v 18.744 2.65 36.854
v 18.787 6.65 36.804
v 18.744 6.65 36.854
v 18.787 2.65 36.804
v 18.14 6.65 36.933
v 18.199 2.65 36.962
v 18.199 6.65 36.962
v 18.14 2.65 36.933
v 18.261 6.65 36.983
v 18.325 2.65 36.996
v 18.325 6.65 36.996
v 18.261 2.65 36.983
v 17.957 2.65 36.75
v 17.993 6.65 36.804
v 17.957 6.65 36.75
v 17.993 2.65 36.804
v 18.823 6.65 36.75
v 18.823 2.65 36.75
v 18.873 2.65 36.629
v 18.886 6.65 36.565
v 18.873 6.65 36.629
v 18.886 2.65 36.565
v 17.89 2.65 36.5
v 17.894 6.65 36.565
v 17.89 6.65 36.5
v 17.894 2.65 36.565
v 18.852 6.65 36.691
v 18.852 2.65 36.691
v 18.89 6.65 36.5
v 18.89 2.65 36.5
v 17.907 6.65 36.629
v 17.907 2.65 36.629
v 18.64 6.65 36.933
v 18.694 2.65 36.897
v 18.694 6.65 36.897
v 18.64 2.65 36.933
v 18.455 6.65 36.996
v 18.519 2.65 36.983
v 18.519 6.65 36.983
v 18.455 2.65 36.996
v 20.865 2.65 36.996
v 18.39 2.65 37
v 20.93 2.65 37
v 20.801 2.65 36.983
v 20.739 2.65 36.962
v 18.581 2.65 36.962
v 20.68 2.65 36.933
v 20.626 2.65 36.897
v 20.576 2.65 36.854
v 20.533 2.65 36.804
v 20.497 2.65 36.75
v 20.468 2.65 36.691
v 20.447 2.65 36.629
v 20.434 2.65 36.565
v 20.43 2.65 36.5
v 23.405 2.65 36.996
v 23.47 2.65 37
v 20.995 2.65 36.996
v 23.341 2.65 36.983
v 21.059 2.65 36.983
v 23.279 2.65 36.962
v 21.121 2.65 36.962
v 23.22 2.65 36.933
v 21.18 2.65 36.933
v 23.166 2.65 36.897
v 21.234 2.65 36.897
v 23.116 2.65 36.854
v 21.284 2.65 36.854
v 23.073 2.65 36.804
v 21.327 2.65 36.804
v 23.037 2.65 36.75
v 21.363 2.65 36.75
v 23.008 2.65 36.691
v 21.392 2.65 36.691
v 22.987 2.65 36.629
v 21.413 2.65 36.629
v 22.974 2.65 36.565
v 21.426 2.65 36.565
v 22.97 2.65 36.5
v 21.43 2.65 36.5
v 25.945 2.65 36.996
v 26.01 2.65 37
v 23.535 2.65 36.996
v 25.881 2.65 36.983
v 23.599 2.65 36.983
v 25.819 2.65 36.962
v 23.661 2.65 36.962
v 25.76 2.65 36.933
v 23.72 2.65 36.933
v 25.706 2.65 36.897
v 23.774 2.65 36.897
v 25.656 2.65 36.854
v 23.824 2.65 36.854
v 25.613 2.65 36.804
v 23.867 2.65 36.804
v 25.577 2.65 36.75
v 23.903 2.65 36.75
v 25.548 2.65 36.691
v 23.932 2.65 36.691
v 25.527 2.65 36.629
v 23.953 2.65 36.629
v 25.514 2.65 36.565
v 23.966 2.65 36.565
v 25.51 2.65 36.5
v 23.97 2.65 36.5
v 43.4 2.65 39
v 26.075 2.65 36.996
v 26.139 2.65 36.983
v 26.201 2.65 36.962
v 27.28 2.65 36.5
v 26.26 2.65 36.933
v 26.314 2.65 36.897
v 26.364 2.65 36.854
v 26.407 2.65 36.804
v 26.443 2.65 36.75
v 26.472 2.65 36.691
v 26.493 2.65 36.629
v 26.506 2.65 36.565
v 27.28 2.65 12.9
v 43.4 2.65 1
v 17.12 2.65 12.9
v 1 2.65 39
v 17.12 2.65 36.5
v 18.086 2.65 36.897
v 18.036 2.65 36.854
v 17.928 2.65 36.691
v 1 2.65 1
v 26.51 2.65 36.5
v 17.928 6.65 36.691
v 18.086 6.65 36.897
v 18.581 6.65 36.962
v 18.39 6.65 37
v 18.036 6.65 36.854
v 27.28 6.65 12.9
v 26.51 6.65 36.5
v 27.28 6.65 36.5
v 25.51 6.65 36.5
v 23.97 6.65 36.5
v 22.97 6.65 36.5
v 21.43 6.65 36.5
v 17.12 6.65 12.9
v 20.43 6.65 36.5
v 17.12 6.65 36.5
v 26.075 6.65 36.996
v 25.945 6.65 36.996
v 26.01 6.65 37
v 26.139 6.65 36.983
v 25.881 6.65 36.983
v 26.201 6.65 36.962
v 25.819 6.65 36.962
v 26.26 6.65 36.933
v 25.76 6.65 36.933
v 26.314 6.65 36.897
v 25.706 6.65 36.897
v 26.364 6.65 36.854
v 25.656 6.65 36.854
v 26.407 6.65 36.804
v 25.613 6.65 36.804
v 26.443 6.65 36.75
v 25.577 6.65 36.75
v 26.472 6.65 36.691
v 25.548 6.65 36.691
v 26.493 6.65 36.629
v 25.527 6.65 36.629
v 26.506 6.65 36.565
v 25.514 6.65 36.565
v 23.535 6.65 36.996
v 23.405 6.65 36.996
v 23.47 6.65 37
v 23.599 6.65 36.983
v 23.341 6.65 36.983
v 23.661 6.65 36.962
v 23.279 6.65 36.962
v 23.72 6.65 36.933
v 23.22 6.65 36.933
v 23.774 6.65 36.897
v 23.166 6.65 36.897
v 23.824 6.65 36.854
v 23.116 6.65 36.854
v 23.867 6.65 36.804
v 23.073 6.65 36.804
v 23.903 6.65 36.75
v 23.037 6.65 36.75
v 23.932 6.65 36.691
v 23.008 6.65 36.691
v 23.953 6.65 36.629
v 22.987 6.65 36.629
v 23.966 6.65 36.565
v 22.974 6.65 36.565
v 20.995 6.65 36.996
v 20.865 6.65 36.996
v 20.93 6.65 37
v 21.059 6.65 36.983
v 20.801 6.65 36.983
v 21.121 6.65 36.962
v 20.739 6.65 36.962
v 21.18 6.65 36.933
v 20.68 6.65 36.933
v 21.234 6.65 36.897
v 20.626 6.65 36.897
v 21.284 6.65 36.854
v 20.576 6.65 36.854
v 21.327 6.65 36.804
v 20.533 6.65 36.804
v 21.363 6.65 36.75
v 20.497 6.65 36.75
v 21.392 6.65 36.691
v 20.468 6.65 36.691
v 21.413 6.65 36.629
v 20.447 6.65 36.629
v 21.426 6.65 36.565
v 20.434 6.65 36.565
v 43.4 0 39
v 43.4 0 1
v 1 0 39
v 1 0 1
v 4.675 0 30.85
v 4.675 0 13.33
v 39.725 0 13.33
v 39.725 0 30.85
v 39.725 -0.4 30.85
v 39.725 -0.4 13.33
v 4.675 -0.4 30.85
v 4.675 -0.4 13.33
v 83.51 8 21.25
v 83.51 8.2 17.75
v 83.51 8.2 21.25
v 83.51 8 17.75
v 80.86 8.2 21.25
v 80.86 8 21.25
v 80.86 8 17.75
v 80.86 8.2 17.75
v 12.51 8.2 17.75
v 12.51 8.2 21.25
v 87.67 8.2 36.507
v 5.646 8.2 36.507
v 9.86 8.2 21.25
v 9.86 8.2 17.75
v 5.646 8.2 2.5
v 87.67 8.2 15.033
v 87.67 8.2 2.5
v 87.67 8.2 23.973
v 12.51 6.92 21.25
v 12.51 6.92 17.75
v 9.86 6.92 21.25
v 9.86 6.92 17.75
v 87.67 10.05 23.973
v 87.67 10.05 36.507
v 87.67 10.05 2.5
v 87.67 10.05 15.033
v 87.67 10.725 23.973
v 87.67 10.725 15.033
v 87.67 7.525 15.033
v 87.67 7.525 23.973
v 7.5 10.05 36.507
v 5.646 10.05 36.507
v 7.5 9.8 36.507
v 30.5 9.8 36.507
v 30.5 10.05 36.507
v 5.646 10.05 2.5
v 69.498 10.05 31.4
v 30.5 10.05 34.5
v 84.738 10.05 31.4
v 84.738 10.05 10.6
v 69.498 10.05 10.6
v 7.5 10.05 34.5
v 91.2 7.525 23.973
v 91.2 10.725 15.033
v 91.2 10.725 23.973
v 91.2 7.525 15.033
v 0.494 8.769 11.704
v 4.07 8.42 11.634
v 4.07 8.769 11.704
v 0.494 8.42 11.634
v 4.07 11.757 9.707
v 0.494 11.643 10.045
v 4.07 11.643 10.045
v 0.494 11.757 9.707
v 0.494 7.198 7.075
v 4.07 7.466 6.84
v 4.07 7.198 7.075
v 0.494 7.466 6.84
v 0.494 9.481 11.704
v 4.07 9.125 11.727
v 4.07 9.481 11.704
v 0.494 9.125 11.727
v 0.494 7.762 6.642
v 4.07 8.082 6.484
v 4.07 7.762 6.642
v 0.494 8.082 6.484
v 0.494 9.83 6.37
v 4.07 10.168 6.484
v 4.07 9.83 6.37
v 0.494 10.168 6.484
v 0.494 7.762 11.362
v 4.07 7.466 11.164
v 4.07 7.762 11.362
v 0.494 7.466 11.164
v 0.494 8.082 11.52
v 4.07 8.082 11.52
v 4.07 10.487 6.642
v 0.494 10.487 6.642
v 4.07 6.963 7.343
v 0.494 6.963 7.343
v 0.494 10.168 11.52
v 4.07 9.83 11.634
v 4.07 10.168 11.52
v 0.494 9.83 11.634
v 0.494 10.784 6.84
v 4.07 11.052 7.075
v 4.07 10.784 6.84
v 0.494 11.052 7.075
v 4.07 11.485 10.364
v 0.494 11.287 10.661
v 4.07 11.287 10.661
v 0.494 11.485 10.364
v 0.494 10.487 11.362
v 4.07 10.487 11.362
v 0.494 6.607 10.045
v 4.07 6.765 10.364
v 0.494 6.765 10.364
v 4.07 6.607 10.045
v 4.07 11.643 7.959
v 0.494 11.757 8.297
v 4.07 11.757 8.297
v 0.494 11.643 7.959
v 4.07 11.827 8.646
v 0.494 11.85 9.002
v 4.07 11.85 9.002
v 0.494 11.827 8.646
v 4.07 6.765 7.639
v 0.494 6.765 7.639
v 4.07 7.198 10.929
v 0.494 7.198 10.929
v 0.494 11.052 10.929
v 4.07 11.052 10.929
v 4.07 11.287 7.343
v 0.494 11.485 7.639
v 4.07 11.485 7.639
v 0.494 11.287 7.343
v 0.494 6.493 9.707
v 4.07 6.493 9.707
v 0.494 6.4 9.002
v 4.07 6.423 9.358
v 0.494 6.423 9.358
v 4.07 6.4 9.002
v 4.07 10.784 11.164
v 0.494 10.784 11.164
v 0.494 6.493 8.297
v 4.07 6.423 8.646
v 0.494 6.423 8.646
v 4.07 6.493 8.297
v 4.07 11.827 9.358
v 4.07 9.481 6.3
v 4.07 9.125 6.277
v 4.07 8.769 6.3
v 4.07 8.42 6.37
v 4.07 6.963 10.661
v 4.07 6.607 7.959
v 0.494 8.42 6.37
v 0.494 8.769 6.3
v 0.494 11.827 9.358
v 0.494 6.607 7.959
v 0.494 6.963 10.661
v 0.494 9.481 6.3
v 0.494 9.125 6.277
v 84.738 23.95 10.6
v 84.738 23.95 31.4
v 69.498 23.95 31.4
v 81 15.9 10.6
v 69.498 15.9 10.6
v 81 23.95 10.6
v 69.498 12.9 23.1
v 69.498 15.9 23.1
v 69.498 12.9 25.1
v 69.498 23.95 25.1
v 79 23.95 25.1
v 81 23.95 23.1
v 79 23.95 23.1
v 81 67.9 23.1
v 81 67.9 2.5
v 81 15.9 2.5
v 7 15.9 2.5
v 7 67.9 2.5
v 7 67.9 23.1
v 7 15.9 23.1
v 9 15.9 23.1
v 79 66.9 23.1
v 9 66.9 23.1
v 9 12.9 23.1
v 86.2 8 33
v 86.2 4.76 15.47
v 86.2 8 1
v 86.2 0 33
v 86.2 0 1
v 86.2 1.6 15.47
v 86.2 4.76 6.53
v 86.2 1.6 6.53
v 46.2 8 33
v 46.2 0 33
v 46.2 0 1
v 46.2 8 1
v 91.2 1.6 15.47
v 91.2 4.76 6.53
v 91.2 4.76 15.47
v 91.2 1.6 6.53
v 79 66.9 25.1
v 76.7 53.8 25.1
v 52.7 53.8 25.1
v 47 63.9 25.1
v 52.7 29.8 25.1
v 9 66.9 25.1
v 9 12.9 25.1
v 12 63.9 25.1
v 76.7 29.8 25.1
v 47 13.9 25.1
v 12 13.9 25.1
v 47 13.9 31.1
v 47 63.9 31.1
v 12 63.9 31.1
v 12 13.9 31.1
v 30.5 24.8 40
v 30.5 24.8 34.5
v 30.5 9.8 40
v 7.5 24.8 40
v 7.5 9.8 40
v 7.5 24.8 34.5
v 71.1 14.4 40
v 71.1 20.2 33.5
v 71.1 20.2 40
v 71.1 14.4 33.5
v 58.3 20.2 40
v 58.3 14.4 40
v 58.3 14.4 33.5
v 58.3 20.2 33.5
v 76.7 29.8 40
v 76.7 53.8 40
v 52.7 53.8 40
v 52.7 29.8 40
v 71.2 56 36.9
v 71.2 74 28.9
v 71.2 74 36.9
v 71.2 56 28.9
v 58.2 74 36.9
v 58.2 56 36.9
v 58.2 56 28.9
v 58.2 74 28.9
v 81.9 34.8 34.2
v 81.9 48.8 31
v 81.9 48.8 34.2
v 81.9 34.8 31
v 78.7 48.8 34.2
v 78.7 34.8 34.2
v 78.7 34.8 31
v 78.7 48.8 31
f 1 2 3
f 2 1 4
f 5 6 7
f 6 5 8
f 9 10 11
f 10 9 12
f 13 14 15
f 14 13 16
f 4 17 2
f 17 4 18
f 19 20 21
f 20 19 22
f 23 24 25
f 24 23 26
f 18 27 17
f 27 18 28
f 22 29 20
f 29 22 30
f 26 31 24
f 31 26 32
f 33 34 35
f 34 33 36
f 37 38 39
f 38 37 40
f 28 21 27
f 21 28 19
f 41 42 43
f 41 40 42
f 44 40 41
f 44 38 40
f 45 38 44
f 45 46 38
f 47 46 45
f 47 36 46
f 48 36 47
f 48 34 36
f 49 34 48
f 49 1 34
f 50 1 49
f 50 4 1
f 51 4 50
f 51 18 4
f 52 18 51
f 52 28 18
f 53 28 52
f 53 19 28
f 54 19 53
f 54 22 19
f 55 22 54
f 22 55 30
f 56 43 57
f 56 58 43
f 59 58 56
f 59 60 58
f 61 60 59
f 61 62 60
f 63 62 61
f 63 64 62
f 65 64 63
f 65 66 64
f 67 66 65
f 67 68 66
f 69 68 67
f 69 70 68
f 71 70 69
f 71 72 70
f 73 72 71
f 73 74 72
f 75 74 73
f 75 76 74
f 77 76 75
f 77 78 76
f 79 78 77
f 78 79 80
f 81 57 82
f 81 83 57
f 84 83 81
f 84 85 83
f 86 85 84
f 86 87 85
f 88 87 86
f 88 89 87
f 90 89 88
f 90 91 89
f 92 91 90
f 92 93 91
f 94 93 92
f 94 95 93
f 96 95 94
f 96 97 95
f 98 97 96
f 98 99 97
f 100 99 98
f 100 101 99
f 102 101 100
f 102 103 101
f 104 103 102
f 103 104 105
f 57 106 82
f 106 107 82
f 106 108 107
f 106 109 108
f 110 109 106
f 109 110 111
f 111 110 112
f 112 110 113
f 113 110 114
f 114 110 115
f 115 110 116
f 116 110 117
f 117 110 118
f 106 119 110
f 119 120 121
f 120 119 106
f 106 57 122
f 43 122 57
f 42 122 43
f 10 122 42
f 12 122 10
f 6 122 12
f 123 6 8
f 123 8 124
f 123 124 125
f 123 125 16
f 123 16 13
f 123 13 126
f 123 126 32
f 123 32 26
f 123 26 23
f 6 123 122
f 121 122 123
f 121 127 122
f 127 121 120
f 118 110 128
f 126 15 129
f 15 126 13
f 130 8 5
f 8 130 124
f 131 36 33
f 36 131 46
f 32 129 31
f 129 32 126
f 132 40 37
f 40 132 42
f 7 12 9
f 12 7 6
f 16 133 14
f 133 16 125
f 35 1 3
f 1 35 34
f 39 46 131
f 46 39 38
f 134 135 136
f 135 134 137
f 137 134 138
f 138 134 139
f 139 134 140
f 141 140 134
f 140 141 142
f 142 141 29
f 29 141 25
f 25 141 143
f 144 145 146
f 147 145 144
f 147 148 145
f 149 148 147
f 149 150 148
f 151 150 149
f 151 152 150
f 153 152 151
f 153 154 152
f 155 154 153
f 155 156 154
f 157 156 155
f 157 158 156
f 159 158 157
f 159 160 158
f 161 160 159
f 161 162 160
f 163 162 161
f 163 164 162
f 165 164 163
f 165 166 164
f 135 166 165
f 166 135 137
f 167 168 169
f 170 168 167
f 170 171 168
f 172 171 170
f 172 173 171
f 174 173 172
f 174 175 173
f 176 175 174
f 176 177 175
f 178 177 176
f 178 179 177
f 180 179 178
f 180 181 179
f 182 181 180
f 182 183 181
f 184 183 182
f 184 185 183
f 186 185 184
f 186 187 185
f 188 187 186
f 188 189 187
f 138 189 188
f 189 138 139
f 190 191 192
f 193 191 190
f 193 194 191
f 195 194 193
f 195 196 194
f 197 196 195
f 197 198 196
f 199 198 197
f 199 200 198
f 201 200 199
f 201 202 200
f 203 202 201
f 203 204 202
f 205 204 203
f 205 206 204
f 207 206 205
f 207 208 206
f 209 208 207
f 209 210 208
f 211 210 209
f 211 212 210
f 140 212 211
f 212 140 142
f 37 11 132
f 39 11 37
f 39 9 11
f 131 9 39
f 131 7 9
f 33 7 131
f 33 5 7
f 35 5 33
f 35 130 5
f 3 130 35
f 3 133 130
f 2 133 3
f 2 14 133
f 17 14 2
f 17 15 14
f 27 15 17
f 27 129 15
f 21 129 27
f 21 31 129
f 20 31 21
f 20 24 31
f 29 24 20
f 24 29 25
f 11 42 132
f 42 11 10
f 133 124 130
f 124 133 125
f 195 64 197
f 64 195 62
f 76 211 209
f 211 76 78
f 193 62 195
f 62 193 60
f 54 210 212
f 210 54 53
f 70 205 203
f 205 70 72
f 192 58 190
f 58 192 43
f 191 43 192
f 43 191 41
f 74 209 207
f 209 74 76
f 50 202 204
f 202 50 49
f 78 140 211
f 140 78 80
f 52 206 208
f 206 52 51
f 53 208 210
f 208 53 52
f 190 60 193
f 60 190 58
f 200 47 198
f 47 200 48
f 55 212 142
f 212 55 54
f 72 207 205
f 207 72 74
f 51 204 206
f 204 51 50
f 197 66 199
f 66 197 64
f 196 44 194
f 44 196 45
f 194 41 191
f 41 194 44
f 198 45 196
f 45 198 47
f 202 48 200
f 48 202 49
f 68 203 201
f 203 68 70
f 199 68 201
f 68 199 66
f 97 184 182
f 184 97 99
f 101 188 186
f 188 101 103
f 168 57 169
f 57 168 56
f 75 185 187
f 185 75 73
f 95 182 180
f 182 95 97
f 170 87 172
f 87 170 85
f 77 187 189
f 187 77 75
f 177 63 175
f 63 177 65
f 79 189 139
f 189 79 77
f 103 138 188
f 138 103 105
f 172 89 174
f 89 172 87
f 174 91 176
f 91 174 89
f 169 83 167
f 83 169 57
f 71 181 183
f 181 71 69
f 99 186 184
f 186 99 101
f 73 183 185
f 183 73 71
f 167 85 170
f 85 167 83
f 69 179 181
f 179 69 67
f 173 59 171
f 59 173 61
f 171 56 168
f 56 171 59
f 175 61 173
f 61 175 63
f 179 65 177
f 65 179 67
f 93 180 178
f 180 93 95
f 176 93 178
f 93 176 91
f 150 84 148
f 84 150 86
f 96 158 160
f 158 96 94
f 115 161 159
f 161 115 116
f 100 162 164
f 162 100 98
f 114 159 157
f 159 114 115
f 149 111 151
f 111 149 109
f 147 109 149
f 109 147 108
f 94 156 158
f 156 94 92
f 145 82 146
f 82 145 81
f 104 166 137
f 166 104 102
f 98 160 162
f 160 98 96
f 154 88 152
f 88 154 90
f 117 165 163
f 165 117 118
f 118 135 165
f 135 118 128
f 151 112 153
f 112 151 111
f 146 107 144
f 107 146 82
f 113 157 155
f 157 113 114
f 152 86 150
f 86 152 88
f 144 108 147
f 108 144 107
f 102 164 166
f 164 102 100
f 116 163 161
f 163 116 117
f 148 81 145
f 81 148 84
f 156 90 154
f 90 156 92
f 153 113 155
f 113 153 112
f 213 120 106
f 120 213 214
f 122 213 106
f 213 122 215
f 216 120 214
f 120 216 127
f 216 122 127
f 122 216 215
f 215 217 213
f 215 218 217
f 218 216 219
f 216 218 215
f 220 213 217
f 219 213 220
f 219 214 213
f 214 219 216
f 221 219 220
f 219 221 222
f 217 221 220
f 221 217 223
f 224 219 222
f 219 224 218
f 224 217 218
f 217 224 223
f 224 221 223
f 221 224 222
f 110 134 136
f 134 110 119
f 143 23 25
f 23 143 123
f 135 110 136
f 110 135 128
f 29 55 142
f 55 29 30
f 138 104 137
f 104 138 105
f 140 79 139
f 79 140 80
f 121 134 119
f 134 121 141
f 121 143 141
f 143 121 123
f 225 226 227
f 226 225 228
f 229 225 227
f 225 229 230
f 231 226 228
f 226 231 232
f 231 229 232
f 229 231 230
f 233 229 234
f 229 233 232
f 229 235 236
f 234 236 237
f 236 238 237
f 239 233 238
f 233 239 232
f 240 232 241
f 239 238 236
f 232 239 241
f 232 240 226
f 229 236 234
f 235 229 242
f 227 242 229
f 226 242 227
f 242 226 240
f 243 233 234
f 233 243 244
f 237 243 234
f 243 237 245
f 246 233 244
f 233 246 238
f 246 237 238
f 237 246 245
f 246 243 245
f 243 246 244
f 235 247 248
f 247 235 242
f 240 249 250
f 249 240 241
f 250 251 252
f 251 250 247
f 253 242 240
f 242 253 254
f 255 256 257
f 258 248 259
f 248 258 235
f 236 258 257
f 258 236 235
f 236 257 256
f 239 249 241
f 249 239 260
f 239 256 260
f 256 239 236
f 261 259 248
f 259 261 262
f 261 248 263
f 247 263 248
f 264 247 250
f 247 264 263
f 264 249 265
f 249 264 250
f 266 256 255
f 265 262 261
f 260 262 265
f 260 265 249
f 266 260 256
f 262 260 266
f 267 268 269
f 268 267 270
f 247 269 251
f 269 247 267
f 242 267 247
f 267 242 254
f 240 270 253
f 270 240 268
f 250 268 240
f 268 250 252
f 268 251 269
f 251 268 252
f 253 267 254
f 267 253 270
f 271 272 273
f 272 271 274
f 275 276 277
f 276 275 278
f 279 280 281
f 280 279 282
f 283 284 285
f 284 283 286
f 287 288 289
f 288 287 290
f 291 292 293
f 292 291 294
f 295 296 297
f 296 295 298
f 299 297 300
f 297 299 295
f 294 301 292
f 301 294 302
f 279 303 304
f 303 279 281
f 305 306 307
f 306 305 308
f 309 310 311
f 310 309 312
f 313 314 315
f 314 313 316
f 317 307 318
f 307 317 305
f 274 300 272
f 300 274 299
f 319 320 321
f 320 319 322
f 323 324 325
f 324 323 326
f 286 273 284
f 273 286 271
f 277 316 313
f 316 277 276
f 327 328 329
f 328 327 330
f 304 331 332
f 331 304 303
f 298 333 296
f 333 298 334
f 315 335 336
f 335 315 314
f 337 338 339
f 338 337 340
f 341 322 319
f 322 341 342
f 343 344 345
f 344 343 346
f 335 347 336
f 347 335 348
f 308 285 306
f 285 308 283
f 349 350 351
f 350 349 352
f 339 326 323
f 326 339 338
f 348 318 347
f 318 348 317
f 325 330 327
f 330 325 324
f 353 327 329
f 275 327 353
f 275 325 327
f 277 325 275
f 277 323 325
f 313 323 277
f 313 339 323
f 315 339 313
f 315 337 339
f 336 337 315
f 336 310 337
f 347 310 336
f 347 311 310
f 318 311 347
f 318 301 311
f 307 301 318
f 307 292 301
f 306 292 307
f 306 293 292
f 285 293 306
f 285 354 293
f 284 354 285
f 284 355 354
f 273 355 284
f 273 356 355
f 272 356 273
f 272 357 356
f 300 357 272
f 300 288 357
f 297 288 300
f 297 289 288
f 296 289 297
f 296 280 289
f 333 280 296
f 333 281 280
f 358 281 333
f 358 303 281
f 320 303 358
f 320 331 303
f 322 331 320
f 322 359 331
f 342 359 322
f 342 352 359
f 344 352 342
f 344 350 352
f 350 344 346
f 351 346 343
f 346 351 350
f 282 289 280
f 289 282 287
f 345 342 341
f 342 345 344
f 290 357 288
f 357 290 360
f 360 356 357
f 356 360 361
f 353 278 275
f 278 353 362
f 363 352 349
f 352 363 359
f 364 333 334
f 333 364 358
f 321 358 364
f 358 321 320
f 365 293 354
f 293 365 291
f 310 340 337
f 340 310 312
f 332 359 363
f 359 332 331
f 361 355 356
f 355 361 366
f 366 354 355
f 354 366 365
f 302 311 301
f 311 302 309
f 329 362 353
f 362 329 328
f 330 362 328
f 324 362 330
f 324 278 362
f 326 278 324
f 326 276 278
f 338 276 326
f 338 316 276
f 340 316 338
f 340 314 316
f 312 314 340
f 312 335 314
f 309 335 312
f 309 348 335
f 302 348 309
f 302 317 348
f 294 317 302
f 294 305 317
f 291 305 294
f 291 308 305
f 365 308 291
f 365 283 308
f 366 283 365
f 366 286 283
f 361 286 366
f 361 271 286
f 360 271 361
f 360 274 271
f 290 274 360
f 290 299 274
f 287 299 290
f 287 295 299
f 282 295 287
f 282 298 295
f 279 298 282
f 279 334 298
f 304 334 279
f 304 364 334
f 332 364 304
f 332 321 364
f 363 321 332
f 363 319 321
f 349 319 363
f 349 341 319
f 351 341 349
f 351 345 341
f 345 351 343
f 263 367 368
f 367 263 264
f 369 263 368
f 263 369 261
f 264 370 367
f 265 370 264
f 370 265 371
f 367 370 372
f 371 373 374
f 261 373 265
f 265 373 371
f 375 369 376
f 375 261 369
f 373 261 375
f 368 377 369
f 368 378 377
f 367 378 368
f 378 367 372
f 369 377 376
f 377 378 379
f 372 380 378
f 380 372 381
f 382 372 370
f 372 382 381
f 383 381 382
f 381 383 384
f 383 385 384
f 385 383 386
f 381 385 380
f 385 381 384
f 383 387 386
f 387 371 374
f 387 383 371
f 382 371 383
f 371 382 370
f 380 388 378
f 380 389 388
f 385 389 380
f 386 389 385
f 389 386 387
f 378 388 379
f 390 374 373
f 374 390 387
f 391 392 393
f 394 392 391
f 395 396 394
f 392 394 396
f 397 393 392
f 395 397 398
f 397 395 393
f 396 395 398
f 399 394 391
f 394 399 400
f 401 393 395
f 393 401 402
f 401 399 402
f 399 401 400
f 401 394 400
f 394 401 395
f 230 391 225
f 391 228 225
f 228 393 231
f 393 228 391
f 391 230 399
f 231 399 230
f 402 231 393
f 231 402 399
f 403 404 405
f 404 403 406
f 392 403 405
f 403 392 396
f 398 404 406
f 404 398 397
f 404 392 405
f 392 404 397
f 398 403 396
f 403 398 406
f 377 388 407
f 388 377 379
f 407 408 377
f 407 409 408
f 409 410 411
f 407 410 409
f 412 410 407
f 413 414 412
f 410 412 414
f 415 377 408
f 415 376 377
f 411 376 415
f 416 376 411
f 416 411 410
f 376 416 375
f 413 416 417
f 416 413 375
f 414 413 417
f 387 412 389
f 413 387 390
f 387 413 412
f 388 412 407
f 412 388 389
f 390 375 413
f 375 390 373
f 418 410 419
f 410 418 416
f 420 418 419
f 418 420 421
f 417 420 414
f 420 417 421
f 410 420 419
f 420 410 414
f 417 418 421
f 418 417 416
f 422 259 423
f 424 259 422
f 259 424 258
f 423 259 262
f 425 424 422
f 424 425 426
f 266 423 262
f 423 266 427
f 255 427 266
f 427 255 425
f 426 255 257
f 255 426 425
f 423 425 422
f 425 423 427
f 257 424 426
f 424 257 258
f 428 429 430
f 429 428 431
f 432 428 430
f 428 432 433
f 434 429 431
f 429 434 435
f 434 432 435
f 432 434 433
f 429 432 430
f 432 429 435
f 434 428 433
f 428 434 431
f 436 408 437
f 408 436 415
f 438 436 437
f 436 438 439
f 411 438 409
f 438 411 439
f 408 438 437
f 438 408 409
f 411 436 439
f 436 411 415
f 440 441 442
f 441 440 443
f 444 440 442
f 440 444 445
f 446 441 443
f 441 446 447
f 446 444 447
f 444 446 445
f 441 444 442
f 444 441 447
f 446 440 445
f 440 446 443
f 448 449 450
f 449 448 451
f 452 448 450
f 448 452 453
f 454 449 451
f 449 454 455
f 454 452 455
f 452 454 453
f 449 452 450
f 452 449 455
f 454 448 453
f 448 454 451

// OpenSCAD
// ============================================================
// 筐体 v6 — 配置（ブロック）
//   方針（ユーザー 2026-09-12）: 全リニューアル。部品をブロックとして置き直す所からやる。
//   数字と向きの正は docs/CASE-V6-PLAN.md。v5 のファイルは読まない（座標を写さない）。
//   この版はまだ**実測の直方体を置いただけ**で、皮・柱・口・線・締結は無い。当たり検査も無い。
//
//   実行:
//     "C:/Program Files/OpenSCAD (Nightly)/openscad.exe" --backend=manifold -o x.png -D "part=\"look\"" hardware/case_v6.scad
//
//   part の値:
//     look   … 中身ぜんぶ（ブロック 4 つ＋段＋電池＋操作部）。内寸の箱は輪郭だけ
//     blocks … ブロック 4 つだけ（OLED・ReSpeaker・ハブ・電源板）
//     front  … 前から見た絵（顔の窓と充電の口の位置を見る）
//     side   … 左半分の側面（前から後ろへの断面の代わり。高さの鎖を見る）
//     （語を足すときはここへ書く。既にある語の意味は変えない）
// ============================================================
part = "look";

use <../../parts/parts.scad>
$fn = 48;

// ---- 箱の中の座標 ----
//   X 0 = 左の壁の内面 ／ Y 0 = 前の壁の内面 ／ Z 0 = 床の上面
//   +X 右（XIAO の USB-C 側）・+Y 後ろ（ハッチ側）・+Z 上（天面）
IN_X = 88.0;
IN_Y = 74.0;
IN_Z = 40.0;

WALL = 2.0;
PORT_BACK = 0.8;   // 口の面を壁の外面の何 mm 裏に置くか。🔒 1.6 裏は実機で挿さらなかった（2026-09-11）

// ---- OLED HS154L03W2C01（📄 hardware/ref/oled_hs154l03w2c01/）----
//   42.40 が横・38.00 が縦。ガラス面が前。🔒 顔は左（ユーザー 2026-09-12）
OLED_L  = 42.40;
OLED_H  = 38.00;
OLED_T  =  2.65;
OLED_X  =  1.0;
OLED_Z  =  1.0;
OLED_AA = [35.05, 17.52];
OLED_AA_EDGE = 8.15;   // 📄 端子側の縁から AA まで。反対側は 12.33（FPC の折り返し）
OLED_PIN_EDGE = 2.50;  // 📄 端子の列から、その縁まで
OLED_PIN_N = 4;
// ⚠ 私が置いた前提①: 端子を**上**の縁へ（窓が高くなる側。下にすると窓は Z 9.2〜26.7）
OLED_PIN_TOP = true;
// ⚠ 私が置いた前提③: L 字の 4 ピンヘッダ。ピンは列と直交する向きに曲がるので**上下（Z）へ出る**。
//    端子が上なので下向きに出す。縁の外へ ピン 6 ＋ ハウジング 14 ＋ 逃げ 3.6 = 23.6（parts.scad の as5600(ra=true) と同じ数え方）
OLED_RA_OUT = 23.6;
OLED_RA_T   =  4.0;   // 板の裏から出る量（L 字にするとここが 17 → 4 になる）

// ---- ReSpeaker Lite（📄 docs/RESPEAKER-LITE.md 5.6 公式 CAD）----
//   立てる。マイク面が前・XIAO 面が後ろ。XIAO は箱の +X 側に来る
RSP_L = 82.024;
RSP_H = 34.007;
RSP_T =  1.85;
RSP_Z =  2.5;                                   // 半田面の逃げ
XIAO_USB_OUT = 1.53;                            // 📄 板の端からの張り出し
RSP_X = IN_X + WALL - PORT_BACK - XIAO_USB_OUT - RSP_L;   // 右端の口を壁に合わせて左端が決まる
RSP_Y = 8.2;                                    // マイク面の Y
JACK_OUT = 1.576;                               // 📄 3.5mm ジャックの筒が左端から出る量
HDR_OUT  = 13.9;                                // ✅ XIAO 面のヘッダ＋線（ユーザー 2026-08-24）

// ---- ハブ基板（hardware/parts/hub_board_parts.scad）----
HUB_L = 74.0;
HUB_W = 52.0;
HUB_T =  1.6;
HUB_X = (IN_X - HUB_L) / 2;
HUB_Y = 15.9;
HUB_Z =  2.5;
HUB_PLUG_TOP = 23.1;   // 床から、口の曲がりの頭まで（樹脂 2.5 ＋ ハウジング 14 ＋ 曲がり 3.0）

// ---- 電源板（docs/POWER.md 案③）----
//   前の壁に立てる。部品面が後ろ。充電の USB-C は右の縁で、板から 3.0 出る
PWR_L = 40.0;
PWR_H = 32.0;
PWR_T =  1.6;
PWR_PARTS_T = 6.4;
PWR_Z = 1.0;
USBC_OUT = 3.0;
PWR_X = IN_X + WALL - PORT_BACK - USBC_OUT - PWR_L;
USBC_FROM_END = 10.0;   // 📄 32 の縁の端から、口の芯まで
USBC_W = 8.94;
USBC_T = 3.16;

// ---- 段と電池 ----
TRAY_T = 2.0;
TRAY_Z = HUB_PLUG_TOP;
BAT_X = 12.0;
BAT_Y = 13.9;
BAT_Z = TRAY_Z + TRAY_T;

// ---- 天板から下がる操作部（🔒 ユーザー 2026-09-08 の席）----
ROW_Y  = 17.3;
ROW_RX = 64.7;
SPK_X  = 19.0;
KNOB_Y = 41.8;
TGL_FROM_TOP = 7.1;
TOP_T = 2.5;
// つまみの AS5600 のヘッダ。false = 直立て ／ true = L 字（ユーザー 2026-09-12 の提案）
KNOB_HDR_RA = false;
// 天板の外面から下への鎖（knob_v5 の Z_PCB_BOT と plug.scad）:
//   基板の裏 19.7 ＋ 直立てなら 樹脂 2.5 ＋ ハウジング 14 ＝ 16.5 ／ L 字なら樹脂まわり 約 4
//   🔴 22.4（バスタブ 2 の板の裏）はヘッダを含まない。2026-09-12 にここを 22.4 で描いて 11.3 浅くしていた
KNOB_PCB_BOT = 19.7;
KNOB_HDR_DEEP = KNOB_HDR_RA ? 4.0 : 2.5 + 14.0;
KNOB_DEEP = KNOB_PCB_BOT + KNOB_HDR_DEEP - TOP_T;   // 内側の天井から下への深さ
KNOB_RA_OUT = 23.6;   // L 字のとき基板の縁の外へ出る量（片側・ピン 6 ＋ ハウジング 14 ＋ 逃げ 3.6）
AS5600_PCB = 23.0;

// ============================================================
module box_outline() {
    difference() {
        cube([IN_X, IN_Y, IN_Z]);
        translate([1, 1, 1]) cube([IN_X - 2, IN_Y - 2, IN_Z - 2]);
    }
}

module oled_block() {
    color("#7f77dd") translate([OLED_X, 0, OLED_Z]) cube([OLED_L, OLED_T, OLED_H]);
    // 窓（AA）。42.40 の方向は中央・38.00 の方向は端子側の縁から OLED_AA_EDGE
    aa_x = OLED_X + (OLED_L - OLED_AA[0]) / 2;
    aa_z = OLED_PIN_TOP ? OLED_Z + OLED_H - OLED_AA_EDGE - OLED_AA[1]
                        : OLED_Z + OLED_AA_EDGE;
    color("#2c2c2a") translate([aa_x, -0.4, aa_z]) cube([OLED_AA[0], 0.4, OLED_AA[1]]);
    // 端子 4 本（φ1.0・2.54 ピッチ・列は 42.40 の方向の中央）と、L 字の包絡
    pin_z = OLED_PIN_TOP ? OLED_Z + OLED_H - OLED_PIN_EDGE : OLED_Z + OLED_PIN_EDGE;
    span  = (OLED_PIN_N - 1) * 2.54;
    pin_x = OLED_X + OLED_L / 2 - span / 2;
    for (i = [0 : OLED_PIN_N - 1])
        color("#bba") translate([pin_x + i * 2.54, OLED_T, pin_z]) rotate([-90, 0, 0]) cylinder(d = 1.0, h = OLED_RA_T);
    ra_z0 = OLED_PIN_TOP ? pin_z - OLED_RA_OUT : pin_z;
    color("#85b7eb", 0.45) translate([pin_x - 1.27, OLED_T, ra_z0]) cube([span + 2.54, OLED_RA_T, OLED_RA_OUT]);
}

module respeaker_block() {
    color("#1d9e75") translate([RSP_X, RSP_Y, RSP_Z]) cube([RSP_L, RSP_T, RSP_H]);
    // 右端の XIAO の USB-C（壁を貫く）と、左端の 3.5mm ジャックの筒
    color("#85b7eb") translate([RSP_X + RSP_L, RSP_Y + RSP_T / 2 - 1.6, RSP_Z + RSP_H / 2 - 4.47])
        cube([XIAO_USB_OUT + WALL, 3.2, 8.94]);
    color("#85b7eb") translate([RSP_X - JACK_OUT, RSP_Y + RSP_T / 2, RSP_Z + 6.502])
        rotate([0, -90, 0]) cylinder(d = 5.45, h = JACK_OUT + WALL);
    // XIAO 面のヘッダ＋線の層（📄 左から 2.932〜18.172 のパッド列。マイク面を前にすると箱の +X 側へ回る）
    hx0 = RSP_X + RSP_L - 18.172;
    color("#9fe1cb", 0.45) translate([hx0, RSP_Y + RSP_T, RSP_Z + 8.1]) cube([15.24, HDR_OUT, 20.8]);
    // 🔒 マイク 2 個（📄 公式 CAD: U4 左から 4.16〜6.81・U5 左から 75.16〜77.81・どちらも下から 15.25〜18.75）。
    //    塞いだら音が死ぬ場所。マイク面を前にすると「左から」は箱の +X 側から数える向きになる
    for (d = [[4.16, 6.81], [75.16, 77.81]])
        color("#e24b4a") translate([RSP_X + RSP_L - d[1], RSP_Y - 1.28, RSP_Z + 15.25])
            cube([d[1] - d[0], 1.28, 3.5]);
}

module hub_block() {
    color("#d85a30") translate([HUB_X, HUB_Y, HUB_Z]) cube([HUB_L, HUB_W, HUB_T]);
    // 口の層（口 8 つは全部上向き。曲がりの頭まで床から HUB_PLUG_TOP）
    color("#f0997b", 0.35) translate([HUB_X, HUB_Y, HUB_Z + HUB_T])
        cube([HUB_L, HUB_W, HUB_PLUG_TOP - HUB_Z - HUB_T]);
}

module power_block() {
    color("#993c1d") translate([PWR_X, 0, PWR_Z]) cube([PWR_L, PWR_T, PWR_H]);
    color("#f0997b", 0.35) translate([PWR_X, PWR_T, PWR_Z]) cube([PWR_L, PWR_PARTS_T, PWR_H]);
    // 充電の USB-C（右の縁・32 の縁の下の端から 10・板から USBC_OUT 出て壁を貫く）
    color("#378add") translate([PWR_X + PWR_L, PWR_T, PWR_Z + USBC_FROM_END - USBC_W / 2])
        cube([USBC_OUT + WALL, USBC_T, USBC_W]);
}

module tray_and_battery() {
    color("#b4b2a9", 0.5) translate([HUB_X + 2, BAT_Y - 1, TRAY_Z]) cube([HUB_L - 4, 54, TRAY_T]);
    color("#ef9f27") translate([BAT_X, BAT_Y, BAT_Z]) cube([lipo_size()[1], lipo_size()[0], lipo_size()[2]]);
}

module deck_parts() {
    // スピーカー（天板の裏・振動面が上）
    color("#534ab7") translate([SPK_X - 11.5, ROW_Y - 7.5, IN_Z - 5.5]) cube([23, 15, 5.5]);
    // 会話ボタン（天板・押しは縦）
    color("#534ab7") translate([ROW_RX - 6.4, ROW_Y - 2.9, IN_Z - 6.5]) cube([12.8, 5.8, 6.5]);
    // つまみの柱（天板から下へ KNOB_DEEP。AS5600 の板 23 角＋逃げ）
    color("#afa9ec", 0.6) translate([ROW_RX - 12, KNOB_Y - 12, IN_Z - KNOB_DEEP]) cube([24, 24, KNOB_DEEP]);
    // トグル MTS-102（ハッチ・軸は水平・後ろ向き。内側に mts102_deep()）
    color("#26215c") translate([ROW_RX - mts102_w() / 2, IN_Y - mts102_deep(), IN_Z - TGL_FROM_TOP - mts102_d() / 2])
        cube([mts102_w(), mts102_deep(), mts102_d()]);
    // リードスイッチ（つまみの脇・軸は水平）
    color("#26215c") translate([ROW_RX + 14, KNOB_Y - 7, IN_Z - 9]) cube([3.2, 14, 3.2]);
}

module blocks_only() {
    oled_block();
    respeaker_block();
    hub_block();
    power_block();
}

if (part == "blocks") {
    blocks_only();
    %box_outline();
} else if (part == "look" || part == "front" || part == "side") {
    blocks_only();
    tray_and_battery();
    deck_parts();
    %box_outline();
} else {
    echo(str("🔴 part の値が不明: ", part));
}

echo(str("内寸 ", IN_X, " x ", IN_Y, " x ", IN_Z, " = ",
         IN_X * IN_Y * IN_Z / 1000, "cm3"));
echo(str("ReSpeaker 左端 ", RSP_X, " / XIAO の口の面 ", RSP_X + RSP_L + XIAO_USB_OUT,
         " / ジャックの筒の先 ", RSP_X - JACK_OUT));
echo(str("電源板 X ", PWR_X, "〜", PWR_X + PWR_L, " / 充電の口の面 ", PWR_X + PWR_L + USBC_OUT));
echo(str("顔と電源板のすき間 ", PWR_X - (OLED_X + OLED_L)));
echo(str("窓 X ", OLED_X + (OLED_L - OLED_AA[0]) / 2, "〜", OLED_X + (OLED_L + OLED_AA[0]) / 2,
         " / Z ", OLED_PIN_TOP ? OLED_Z + OLED_H - OLED_AA_EDGE - OLED_AA[1] : OLED_Z + OLED_AA_EDGE,
         "〜", OLED_PIN_TOP ? OLED_Z + OLED_H - OLED_AA_EDGE : OLED_Z + OLED_AA_EDGE + OLED_AA[1]));
